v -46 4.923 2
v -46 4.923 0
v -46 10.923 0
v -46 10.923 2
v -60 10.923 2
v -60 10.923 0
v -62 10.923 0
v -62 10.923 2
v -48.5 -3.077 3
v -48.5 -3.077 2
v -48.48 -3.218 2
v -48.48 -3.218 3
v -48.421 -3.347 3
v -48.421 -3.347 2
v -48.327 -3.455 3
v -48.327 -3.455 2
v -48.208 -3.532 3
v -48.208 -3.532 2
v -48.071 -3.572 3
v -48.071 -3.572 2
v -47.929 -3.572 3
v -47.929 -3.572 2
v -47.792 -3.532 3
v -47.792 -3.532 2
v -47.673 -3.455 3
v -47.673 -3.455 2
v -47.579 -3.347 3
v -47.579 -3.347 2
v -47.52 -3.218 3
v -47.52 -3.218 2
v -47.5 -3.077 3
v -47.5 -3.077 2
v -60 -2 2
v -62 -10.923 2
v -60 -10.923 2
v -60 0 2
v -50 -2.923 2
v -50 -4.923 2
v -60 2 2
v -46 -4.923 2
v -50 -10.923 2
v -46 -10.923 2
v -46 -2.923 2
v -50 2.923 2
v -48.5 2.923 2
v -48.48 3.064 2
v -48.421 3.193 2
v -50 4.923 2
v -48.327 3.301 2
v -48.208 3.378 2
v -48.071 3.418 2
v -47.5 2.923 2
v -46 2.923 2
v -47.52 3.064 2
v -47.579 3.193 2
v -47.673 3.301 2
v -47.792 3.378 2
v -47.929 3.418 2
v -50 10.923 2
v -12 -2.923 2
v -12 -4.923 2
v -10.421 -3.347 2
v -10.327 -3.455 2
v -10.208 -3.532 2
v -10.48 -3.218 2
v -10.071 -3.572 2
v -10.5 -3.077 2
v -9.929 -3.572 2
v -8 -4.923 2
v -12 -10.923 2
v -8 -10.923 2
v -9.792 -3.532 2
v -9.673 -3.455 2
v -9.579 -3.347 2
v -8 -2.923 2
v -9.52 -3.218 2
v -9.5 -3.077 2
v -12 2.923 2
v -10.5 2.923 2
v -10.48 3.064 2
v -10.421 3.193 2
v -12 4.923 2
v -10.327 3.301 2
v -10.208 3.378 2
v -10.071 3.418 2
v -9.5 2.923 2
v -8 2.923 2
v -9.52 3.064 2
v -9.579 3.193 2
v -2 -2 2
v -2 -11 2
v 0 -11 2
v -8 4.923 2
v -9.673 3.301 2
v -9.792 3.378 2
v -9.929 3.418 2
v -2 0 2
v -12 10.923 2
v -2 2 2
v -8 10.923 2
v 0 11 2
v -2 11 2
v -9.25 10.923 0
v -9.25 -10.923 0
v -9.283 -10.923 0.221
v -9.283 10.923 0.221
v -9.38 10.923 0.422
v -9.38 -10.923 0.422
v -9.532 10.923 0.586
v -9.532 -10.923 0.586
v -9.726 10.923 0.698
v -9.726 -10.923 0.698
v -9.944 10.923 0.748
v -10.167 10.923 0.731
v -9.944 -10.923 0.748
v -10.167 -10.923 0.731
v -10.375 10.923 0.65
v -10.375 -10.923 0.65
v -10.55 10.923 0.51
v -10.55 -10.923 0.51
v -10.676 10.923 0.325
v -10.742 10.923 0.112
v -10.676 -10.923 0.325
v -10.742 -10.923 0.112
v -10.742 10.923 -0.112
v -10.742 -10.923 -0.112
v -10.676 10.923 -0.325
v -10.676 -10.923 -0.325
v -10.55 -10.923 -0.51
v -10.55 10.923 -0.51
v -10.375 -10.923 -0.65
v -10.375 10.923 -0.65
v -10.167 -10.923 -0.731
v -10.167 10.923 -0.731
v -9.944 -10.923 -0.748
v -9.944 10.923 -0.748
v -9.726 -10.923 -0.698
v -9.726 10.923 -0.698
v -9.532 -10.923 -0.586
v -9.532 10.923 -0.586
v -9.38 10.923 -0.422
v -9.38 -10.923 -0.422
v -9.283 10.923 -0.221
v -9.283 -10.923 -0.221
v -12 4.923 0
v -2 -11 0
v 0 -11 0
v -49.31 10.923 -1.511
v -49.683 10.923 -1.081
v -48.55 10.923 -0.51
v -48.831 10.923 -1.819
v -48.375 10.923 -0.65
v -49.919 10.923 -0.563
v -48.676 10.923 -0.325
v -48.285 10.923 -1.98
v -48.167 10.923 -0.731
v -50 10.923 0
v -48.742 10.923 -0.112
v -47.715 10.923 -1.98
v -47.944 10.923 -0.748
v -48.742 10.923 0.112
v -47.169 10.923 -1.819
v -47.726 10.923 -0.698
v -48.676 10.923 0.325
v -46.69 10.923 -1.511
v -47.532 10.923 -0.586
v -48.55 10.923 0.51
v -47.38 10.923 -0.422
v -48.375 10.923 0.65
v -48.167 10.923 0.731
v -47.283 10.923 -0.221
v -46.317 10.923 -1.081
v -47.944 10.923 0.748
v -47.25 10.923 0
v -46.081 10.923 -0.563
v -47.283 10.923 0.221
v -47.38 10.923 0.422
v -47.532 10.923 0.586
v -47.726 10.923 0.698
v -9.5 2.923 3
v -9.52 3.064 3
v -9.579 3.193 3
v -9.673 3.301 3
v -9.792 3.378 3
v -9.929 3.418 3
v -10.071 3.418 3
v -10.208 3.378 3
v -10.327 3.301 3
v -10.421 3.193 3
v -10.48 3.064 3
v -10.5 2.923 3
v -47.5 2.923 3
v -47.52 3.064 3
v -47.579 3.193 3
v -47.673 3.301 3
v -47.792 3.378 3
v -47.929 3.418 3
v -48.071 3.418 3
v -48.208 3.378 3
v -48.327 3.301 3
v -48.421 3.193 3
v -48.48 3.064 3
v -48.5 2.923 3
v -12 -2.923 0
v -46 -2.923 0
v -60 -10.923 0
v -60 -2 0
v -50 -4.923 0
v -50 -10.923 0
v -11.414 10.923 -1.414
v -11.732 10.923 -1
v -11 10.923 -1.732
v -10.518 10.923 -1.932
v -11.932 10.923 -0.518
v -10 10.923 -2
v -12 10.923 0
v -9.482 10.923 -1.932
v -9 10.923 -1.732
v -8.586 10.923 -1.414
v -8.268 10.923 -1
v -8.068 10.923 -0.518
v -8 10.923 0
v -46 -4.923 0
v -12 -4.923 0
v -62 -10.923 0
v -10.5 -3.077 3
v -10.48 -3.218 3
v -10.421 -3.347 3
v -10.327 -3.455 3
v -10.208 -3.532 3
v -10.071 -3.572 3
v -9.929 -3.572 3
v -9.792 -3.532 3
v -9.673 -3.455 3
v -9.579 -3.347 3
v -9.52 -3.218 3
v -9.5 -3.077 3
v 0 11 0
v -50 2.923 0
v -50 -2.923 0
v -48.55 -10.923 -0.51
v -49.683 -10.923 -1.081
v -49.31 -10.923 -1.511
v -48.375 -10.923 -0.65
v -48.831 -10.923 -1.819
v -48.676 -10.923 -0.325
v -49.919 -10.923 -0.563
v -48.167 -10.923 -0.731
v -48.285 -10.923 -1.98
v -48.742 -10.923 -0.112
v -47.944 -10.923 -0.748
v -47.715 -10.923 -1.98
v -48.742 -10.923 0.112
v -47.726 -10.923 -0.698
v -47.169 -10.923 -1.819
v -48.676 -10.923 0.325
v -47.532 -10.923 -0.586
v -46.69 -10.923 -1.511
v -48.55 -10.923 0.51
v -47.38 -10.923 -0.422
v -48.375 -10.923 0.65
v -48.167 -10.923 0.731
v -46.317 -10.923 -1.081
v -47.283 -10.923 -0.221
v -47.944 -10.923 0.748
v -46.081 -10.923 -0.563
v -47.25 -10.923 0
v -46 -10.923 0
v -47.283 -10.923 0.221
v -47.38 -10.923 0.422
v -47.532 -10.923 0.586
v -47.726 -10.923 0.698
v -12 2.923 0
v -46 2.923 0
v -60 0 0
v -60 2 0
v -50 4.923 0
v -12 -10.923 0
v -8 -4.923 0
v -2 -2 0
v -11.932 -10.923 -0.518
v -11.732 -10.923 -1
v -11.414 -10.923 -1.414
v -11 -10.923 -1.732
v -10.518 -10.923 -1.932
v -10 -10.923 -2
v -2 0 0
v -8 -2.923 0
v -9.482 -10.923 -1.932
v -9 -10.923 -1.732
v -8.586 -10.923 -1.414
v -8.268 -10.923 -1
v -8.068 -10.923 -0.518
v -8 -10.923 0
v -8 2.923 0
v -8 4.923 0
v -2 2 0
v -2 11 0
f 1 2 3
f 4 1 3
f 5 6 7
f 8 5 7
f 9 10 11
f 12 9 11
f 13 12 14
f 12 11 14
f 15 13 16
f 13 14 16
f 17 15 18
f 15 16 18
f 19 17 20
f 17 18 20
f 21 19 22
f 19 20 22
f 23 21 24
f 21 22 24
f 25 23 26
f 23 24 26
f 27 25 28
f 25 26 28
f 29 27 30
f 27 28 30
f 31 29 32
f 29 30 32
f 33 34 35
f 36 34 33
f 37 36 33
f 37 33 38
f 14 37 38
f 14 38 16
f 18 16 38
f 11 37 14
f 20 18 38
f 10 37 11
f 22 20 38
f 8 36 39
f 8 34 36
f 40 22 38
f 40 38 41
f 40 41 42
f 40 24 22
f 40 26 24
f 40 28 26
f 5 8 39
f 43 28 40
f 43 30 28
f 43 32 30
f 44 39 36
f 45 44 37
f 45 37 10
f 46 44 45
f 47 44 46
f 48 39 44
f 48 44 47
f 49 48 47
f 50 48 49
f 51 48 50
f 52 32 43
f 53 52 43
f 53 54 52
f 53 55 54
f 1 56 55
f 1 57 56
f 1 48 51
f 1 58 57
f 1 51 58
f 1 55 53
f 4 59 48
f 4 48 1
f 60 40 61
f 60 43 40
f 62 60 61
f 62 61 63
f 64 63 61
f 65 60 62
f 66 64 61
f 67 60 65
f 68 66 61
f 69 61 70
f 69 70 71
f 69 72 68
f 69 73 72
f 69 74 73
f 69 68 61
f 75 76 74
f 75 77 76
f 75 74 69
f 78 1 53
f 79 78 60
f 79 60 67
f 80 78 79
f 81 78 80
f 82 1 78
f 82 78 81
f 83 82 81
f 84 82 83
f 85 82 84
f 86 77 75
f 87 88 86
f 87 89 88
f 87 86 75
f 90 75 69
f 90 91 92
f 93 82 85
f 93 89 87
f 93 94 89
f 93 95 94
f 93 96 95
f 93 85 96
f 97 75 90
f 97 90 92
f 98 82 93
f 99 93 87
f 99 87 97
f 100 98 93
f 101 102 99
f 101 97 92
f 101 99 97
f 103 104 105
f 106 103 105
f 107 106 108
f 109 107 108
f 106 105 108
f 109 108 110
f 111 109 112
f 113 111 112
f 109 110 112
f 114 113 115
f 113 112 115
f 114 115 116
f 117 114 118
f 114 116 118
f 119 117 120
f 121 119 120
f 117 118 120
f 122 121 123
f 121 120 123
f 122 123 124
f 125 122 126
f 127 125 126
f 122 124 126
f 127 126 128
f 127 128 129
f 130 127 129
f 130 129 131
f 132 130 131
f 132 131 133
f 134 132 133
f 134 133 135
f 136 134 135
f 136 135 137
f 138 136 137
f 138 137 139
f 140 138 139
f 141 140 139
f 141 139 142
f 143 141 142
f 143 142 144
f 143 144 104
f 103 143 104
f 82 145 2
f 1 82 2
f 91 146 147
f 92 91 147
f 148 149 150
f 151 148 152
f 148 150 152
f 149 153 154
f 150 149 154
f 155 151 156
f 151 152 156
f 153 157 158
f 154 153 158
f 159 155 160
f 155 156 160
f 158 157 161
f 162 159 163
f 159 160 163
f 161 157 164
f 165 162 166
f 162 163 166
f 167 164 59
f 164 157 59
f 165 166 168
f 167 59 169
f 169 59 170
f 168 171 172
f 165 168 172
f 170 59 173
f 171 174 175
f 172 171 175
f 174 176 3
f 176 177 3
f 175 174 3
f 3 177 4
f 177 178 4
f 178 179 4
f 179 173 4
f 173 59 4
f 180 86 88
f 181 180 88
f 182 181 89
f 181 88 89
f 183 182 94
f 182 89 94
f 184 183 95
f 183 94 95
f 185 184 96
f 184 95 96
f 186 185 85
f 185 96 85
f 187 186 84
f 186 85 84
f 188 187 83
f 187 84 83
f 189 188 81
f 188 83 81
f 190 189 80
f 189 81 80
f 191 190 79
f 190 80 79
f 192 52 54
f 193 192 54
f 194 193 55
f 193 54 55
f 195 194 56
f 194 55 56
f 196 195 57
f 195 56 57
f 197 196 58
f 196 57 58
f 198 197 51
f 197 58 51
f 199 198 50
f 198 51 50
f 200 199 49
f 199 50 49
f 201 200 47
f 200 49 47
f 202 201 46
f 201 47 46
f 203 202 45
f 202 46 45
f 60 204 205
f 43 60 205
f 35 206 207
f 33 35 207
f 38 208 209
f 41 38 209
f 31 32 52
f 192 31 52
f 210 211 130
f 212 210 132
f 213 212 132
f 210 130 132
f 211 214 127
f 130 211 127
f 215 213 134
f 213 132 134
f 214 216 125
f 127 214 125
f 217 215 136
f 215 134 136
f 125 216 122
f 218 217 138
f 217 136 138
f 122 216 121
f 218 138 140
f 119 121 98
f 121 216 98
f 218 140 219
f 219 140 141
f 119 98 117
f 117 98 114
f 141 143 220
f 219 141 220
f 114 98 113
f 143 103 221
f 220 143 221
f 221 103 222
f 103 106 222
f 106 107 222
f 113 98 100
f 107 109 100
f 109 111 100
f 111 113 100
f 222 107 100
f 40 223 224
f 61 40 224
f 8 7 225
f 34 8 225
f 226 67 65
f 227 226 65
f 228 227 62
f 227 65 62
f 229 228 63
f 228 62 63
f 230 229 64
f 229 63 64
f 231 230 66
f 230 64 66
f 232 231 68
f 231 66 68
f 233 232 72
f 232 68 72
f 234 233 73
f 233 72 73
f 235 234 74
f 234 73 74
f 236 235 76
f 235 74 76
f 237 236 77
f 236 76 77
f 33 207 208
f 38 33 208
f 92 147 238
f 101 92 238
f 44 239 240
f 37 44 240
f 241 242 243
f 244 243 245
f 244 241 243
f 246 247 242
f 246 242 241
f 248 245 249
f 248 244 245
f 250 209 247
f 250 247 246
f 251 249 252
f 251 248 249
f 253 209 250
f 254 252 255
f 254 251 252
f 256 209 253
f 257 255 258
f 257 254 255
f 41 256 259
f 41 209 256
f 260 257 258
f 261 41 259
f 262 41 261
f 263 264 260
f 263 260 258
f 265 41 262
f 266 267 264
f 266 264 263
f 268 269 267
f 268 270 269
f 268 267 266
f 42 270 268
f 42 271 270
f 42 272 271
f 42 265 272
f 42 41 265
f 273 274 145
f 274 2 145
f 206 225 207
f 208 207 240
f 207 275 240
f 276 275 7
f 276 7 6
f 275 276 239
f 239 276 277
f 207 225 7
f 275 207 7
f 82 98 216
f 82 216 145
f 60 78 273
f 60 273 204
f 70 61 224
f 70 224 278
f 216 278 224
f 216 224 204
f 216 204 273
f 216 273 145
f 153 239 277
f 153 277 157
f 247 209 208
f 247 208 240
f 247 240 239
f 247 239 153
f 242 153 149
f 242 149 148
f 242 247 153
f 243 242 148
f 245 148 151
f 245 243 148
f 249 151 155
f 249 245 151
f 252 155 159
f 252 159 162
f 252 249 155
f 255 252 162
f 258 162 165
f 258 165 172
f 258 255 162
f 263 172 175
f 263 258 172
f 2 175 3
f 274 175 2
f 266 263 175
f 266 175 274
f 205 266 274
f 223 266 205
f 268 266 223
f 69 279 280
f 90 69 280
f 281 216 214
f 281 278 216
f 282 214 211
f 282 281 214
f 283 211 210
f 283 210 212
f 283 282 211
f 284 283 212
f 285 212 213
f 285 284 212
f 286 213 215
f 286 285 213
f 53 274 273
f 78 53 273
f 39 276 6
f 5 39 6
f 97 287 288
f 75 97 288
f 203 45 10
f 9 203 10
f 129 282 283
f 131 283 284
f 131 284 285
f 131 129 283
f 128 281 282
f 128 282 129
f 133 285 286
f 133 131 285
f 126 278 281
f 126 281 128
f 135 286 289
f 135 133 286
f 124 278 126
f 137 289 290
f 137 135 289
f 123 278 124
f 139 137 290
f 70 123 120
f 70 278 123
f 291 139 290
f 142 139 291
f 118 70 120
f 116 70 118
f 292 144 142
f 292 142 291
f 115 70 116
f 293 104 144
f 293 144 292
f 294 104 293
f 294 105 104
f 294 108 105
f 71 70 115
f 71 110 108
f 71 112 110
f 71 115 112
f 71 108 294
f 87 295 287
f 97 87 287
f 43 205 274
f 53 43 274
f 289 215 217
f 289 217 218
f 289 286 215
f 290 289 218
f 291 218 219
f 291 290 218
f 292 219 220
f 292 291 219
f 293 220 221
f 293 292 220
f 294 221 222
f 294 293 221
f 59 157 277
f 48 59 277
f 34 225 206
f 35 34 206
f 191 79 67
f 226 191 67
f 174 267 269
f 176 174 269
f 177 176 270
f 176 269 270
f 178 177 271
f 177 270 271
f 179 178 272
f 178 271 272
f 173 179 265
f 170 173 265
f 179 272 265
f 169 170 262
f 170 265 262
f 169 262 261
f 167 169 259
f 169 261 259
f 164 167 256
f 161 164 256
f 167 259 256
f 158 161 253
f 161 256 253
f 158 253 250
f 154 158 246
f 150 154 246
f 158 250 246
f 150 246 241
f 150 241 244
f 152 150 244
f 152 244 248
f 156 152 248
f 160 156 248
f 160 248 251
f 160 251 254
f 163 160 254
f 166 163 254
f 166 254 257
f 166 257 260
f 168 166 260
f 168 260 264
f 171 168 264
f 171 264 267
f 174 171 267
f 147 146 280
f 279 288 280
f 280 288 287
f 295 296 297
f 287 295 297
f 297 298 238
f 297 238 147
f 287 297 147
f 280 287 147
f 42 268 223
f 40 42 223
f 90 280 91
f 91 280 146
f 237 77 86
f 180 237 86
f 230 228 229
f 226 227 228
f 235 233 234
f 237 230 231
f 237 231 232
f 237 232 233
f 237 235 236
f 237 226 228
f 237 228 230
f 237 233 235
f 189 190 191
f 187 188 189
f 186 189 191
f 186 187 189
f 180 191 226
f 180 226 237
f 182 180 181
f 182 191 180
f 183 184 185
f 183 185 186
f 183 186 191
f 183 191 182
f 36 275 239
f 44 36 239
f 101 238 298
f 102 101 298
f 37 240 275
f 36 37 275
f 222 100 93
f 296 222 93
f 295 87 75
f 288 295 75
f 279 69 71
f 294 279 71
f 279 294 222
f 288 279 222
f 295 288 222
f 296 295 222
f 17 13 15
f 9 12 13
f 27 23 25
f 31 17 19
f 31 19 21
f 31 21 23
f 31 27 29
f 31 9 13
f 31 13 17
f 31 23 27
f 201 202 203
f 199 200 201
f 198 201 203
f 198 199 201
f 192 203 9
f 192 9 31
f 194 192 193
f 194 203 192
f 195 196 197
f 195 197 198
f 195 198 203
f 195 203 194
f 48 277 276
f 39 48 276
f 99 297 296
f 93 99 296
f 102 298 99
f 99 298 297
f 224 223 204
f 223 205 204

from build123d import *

# Parameters (mm, degrees)
F1_DEPTH  = 2
F3_DEPTH  = 1
F5_DEPTH  = 21.8461783077
F6_W      = 4
F6_H      = 21.8461783077
F7_DEPTH  = 2
F8_R      = 1.99999
F10_R     = 0.75
F9_R      = 0.75
F11_DEPTH = 21.9240891538


# Not quite as in the source:
# - a fillet or chamfer is up to 0.001 mm smaller than in the source, because OpenCascade refuses the exact size


with BuildPart() as f1:
    # F0 (on Top) → F1 (new body)
    with BuildSketch(Plane.XY):
        Polygon((0, -11), (0, 0), (0, 11), (-2, 11), (-2, 2), (-8, 4.9230891538), (-8, 10.9230891538), (-12, 10.9230891538), (-12, 4.9230891538), (-29, 4.9230891538), (-46, 4.9230891538), (-46, 10.9230891538), (-50, 10.9230891538), (-50, 4.9230891538), (-60, 2), (-60, 10.9230891538), (-62, 10.9230891538), (-62, -10.9230891538), (-60, -10.9230891538), (-60, -2), (-50, -4.9230891538), (-50, -10.9230891538), (-46, -10.9230891538), (-46, -4.9230891538), (-29, -4.9230891538), (-12, -4.9230891538), (-12, -10.9230891538), (-8, -10.9230891538), (-8, -4.9230891538), (-2, -2), (-2, -11), align=None)
        Polygon((-60, 0), (-50, 2.9230891538), (-50, -2.9230891538), align=None, mode=Mode.SUBTRACT)
        Polygon((-12, 2.9230891538), (-12, 0), (-12, -2.9230891538), (-29, -2.9230891538), (-46, -2.9230891538), (-46, 0), (-46, 2.9230891538), (-29, 2.9230891538), align=None, mode=Mode.SUBTRACT)
        Polygon((-8, 2.9230891538), (-2, 0), (-8, -2.9230891538), (-8, 0), align=None, mode=Mode.SUBTRACT)
    extrude(amount=F1_DEPTH)

    # F2 (on face) → F3 (join)
    with BuildSketch(Plane.XY.offset(2)):
        with BuildLine():
            Line((-47.5, -3.0769108462), (-47.5, 2.9230891538))
            ThreePointArc((-47.5, 2.9230891538), (-48, 3.4230891538), (-48.5, 2.9230891538))
            Line((-48.5, 2.9230891538), (-48.5, -3.0769108462))
            ThreePointArc((-48.5, -3.0769108462), (-48, -3.5769108462), (-47.5, -3.0769108462))
        make_face()
        with BuildLine():
            Line((-9.5, -3.0769108462), (-9.5, 2.9230891538))
            ThreePointArc((-9.5, 2.9230891538), (-10, 3.4230891538), (-10.5, 2.9230891538))
            Line((-10.5, 2.9230891538), (-10.5, -3.0769108462))
            ThreePointArc((-10.5, -3.0769108462), (-10, -3.5769108462), (-9.5, -3.0769108462))
        make_face()
    extrude(amount=F3_DEPTH)

    # F4 (on face) → F5 (join, through all)
    with BuildSketch(Plane.XZ.offset(10.9230891538)):
        with BuildLine():
            Line((-46, 0), (-50, 0))
            ThreePointArc((-50, 0), (-48, -2), (-46, 0))
        make_face()
    extrude(amount=-F5_DEPTH)

    # F6 (on face) → F7 (join)
    with BuildSketch(Plane(origin=(0, 0, 0), x_dir=(1, 0, 0), z_dir=(0, 0, -1))):
        with Locations((-10, 0)):
            Rectangle(F6_W, F6_H)
    extrude(amount=F7_DEPTH)

    # F8 (radius 2 in the source; OpenCascade refuses exactly that, so slightly less here)
    f8_edges = [f1.edges().sort_by_distance(p)[0] for p in [
        (-12, 0, -2),
        (-8, 0, -2),
    ]]
    fillet(f8_edges, radius=F8_R)

    # F10 (on face) + F9 (on face) → F11 (cut, through all)
    with BuildSketch(Plane.XZ.offset(10.9230891538)):
        with Locations((-10, 0)):
            Circle(F10_R)
    with BuildSketch(Plane.XZ.offset(10.9230891538)):
        with Locations((-48, 0)):
            Circle(F9_R)
    extrude(amount=-F11_DEPTH, mode=Mode.SUBTRACT)


solid = f1.part
